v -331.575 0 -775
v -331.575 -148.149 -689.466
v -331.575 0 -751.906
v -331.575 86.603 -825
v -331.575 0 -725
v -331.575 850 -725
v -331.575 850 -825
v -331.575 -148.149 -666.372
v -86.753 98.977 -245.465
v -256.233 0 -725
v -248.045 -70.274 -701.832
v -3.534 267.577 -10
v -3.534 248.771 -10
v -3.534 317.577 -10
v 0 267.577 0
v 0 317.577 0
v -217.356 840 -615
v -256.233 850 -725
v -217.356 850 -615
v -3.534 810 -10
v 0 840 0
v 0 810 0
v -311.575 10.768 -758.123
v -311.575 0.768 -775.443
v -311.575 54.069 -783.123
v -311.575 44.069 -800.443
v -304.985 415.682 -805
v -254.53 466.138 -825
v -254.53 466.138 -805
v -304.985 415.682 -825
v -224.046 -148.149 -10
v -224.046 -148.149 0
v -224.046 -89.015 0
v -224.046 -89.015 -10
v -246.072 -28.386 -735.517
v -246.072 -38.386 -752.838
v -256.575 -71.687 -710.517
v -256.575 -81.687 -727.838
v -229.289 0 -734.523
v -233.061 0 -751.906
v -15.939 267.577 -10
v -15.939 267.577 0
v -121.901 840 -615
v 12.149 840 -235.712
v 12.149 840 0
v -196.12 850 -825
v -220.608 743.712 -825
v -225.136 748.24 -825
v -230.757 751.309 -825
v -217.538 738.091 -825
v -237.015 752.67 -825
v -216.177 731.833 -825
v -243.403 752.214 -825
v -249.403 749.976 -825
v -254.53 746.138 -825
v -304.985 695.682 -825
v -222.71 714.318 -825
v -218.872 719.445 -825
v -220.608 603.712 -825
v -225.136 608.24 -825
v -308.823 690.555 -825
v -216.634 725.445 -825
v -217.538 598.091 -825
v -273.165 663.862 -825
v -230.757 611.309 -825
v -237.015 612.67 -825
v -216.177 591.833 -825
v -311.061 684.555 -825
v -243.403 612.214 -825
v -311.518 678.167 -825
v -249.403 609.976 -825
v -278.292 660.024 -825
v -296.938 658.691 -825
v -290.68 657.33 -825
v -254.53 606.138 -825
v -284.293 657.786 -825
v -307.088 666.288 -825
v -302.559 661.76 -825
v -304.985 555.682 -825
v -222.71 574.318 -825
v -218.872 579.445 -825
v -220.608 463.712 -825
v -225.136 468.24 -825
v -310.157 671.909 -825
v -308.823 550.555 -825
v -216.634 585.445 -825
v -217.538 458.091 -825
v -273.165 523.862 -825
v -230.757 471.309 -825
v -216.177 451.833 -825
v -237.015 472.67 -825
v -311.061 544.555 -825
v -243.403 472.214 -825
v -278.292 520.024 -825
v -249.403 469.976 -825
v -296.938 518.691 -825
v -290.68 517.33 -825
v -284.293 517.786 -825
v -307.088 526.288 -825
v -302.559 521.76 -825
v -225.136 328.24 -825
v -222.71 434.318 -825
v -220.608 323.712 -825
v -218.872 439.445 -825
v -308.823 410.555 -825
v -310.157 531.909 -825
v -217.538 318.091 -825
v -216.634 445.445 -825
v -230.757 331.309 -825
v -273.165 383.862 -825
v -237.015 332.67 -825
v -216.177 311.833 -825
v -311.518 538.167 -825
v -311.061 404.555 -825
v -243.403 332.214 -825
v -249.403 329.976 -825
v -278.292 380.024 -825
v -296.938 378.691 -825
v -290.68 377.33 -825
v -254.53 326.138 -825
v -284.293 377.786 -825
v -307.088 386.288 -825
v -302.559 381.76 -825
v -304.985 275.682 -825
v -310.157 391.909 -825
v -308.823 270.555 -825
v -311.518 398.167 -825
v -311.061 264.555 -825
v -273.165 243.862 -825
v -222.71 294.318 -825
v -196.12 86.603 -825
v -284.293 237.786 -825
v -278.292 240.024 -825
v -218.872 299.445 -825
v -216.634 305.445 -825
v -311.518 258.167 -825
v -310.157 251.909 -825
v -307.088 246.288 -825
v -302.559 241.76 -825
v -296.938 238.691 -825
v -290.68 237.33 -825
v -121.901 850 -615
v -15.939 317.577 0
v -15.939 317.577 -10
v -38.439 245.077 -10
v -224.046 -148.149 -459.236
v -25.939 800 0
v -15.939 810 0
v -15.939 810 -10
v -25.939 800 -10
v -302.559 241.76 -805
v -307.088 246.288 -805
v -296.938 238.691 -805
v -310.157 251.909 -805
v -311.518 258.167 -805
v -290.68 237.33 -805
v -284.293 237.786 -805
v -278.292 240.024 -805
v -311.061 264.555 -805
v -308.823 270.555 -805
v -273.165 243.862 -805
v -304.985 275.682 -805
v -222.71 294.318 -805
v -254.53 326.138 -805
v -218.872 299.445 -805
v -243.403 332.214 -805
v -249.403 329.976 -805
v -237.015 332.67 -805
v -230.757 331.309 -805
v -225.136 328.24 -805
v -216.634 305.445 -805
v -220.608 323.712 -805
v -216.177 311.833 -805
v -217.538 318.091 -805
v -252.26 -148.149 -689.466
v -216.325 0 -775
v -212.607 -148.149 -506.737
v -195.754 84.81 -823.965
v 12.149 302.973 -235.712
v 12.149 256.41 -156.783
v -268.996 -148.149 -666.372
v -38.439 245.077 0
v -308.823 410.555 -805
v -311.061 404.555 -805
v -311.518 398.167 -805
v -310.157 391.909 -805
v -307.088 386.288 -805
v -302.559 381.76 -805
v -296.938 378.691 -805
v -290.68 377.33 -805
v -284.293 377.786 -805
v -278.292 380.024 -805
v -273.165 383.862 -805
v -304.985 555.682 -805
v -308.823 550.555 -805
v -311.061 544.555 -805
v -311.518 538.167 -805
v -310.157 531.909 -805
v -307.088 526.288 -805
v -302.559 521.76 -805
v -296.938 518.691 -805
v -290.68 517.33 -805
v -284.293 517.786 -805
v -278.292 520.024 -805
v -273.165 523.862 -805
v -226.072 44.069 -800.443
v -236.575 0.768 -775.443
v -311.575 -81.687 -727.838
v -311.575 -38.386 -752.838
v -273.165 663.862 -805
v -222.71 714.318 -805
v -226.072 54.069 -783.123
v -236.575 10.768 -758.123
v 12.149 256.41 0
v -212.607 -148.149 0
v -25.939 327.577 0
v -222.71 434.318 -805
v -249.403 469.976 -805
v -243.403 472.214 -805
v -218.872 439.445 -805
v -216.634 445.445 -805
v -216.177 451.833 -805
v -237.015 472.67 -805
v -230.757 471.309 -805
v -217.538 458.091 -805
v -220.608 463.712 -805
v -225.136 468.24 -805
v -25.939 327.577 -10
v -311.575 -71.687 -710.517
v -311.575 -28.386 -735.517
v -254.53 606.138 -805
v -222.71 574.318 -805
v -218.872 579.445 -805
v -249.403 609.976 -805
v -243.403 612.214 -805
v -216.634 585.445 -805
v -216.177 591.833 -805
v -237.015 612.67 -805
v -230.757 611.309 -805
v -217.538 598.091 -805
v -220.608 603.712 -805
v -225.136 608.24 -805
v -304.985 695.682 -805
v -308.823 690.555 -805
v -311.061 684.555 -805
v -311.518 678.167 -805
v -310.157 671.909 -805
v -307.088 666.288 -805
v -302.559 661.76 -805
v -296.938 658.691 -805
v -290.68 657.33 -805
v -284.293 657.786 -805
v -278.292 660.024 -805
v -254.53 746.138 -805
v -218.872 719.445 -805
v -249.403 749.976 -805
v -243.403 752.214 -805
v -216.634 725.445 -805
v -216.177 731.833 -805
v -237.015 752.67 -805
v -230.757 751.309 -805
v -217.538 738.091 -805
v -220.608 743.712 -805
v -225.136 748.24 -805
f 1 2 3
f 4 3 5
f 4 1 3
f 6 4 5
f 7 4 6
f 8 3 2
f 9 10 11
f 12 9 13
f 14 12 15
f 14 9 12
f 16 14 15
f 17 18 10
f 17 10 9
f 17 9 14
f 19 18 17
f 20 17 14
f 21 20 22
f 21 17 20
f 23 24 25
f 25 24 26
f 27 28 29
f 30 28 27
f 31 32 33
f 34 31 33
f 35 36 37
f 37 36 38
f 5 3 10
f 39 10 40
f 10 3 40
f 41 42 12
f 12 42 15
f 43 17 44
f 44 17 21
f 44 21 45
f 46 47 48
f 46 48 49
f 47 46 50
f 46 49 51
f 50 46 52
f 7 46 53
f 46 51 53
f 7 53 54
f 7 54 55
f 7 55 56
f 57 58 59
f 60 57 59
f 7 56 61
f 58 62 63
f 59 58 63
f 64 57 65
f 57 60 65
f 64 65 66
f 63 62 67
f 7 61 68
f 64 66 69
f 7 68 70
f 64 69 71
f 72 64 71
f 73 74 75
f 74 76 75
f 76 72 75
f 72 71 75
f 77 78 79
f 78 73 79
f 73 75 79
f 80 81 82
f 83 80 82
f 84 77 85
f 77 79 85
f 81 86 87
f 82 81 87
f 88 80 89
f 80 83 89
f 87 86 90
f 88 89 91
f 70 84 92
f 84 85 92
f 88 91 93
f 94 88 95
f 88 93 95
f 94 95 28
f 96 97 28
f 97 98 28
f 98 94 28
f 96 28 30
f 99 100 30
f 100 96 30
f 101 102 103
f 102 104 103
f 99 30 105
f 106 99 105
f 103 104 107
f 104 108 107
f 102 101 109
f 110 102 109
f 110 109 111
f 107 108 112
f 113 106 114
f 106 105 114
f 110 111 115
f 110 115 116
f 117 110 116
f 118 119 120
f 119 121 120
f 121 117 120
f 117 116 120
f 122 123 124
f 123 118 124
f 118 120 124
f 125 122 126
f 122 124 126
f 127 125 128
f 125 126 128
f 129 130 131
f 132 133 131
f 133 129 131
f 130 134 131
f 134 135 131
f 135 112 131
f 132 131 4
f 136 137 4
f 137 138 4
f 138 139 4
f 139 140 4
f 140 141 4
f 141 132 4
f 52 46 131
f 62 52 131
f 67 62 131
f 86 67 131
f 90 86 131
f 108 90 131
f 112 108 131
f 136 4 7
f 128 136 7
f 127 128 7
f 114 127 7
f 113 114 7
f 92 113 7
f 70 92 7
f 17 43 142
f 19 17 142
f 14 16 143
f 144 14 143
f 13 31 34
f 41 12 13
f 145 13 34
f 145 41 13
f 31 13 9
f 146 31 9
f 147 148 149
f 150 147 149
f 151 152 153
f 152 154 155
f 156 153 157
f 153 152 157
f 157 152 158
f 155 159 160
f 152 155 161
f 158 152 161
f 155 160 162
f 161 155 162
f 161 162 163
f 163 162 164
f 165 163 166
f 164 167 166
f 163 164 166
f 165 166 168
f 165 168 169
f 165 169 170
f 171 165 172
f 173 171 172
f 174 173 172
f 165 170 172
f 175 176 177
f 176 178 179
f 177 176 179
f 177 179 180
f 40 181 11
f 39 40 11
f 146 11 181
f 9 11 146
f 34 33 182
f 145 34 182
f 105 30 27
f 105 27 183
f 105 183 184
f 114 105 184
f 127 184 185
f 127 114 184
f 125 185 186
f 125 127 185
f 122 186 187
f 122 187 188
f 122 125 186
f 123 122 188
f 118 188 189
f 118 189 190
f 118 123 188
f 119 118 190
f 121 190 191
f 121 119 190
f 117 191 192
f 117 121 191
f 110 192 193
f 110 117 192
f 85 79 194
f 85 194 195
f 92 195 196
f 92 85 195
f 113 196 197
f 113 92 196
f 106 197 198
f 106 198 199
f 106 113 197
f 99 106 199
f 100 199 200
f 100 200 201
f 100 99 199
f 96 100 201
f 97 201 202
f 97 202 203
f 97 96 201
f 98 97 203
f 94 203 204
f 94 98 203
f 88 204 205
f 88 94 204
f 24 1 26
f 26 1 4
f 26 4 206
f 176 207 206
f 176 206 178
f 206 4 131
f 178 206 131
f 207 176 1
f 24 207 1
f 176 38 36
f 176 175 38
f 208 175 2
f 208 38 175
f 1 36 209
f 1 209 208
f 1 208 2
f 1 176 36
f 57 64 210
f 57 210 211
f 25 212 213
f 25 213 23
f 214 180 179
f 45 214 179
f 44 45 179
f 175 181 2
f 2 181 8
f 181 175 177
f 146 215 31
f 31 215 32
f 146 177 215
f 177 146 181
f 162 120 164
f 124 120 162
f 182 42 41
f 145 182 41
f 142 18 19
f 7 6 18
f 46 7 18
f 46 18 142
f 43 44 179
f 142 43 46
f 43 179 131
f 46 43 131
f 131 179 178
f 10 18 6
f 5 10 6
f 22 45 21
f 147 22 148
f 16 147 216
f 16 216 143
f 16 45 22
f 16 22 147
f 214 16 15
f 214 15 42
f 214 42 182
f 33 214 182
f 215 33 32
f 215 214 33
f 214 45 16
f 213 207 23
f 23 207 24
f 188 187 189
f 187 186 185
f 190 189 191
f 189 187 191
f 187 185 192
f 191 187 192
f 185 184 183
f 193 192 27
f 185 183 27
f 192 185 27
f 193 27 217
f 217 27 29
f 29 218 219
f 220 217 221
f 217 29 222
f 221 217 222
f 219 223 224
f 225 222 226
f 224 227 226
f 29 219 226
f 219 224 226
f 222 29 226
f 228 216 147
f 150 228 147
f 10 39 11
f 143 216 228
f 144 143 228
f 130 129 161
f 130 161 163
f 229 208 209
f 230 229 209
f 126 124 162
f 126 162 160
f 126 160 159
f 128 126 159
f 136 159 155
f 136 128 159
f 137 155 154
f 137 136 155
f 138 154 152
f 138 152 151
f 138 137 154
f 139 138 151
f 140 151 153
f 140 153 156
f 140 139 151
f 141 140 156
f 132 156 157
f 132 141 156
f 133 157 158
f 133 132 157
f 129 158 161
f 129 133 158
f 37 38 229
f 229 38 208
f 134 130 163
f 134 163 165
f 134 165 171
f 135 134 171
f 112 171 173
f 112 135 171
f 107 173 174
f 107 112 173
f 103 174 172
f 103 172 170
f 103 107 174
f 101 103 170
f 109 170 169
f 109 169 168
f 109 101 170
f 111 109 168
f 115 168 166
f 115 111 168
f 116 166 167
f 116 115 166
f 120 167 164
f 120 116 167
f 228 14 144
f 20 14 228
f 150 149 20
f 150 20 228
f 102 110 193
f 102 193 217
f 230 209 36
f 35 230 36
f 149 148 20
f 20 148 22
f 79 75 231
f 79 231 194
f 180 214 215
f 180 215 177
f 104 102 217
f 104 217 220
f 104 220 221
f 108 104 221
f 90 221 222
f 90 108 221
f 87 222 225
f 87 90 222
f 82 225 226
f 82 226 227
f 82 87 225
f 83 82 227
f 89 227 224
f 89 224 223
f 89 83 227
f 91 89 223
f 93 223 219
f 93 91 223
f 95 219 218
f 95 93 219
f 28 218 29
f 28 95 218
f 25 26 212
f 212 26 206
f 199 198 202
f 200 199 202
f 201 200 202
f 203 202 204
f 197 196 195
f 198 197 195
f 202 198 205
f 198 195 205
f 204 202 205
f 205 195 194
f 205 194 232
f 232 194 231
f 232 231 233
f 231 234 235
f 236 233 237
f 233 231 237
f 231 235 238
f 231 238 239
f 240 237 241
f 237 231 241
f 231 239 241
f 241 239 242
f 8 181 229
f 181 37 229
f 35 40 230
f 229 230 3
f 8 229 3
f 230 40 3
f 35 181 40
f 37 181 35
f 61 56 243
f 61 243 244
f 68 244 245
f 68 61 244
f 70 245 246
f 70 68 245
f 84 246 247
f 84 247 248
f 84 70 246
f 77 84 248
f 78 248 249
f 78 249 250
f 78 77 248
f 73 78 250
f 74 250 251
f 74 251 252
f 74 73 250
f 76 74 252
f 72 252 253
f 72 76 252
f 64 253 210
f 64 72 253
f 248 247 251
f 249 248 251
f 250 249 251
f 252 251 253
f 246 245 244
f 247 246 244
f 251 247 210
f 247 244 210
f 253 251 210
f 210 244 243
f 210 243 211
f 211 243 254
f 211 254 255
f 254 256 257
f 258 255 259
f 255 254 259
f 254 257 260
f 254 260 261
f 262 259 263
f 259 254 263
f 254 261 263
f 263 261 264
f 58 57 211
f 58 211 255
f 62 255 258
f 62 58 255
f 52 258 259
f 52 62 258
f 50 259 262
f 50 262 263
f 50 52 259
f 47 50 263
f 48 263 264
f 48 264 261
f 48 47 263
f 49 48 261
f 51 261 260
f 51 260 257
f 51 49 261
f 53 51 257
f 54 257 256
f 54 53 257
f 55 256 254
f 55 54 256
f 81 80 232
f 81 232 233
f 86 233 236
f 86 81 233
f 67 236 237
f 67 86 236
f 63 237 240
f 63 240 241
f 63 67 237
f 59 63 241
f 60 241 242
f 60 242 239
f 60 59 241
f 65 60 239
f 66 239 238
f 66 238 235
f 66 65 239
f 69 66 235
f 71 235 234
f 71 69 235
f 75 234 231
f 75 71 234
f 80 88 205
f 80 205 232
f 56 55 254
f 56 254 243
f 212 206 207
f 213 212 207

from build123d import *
from OCP.BRepFilletAPI import BRepFilletAPI_MakeChamfer

# Parameters (mm, degrees)
BOSS_EXTRU_2_DEPTH            = 850
ESQUISSE2_W                   = 135.455554094
ESQUISSE2_H                   = 850
BOSS_EXTRU_4_DEPTH            = 100
ESQUISSE7_W                   = 615
ESQUISSE7_H                   = 10
ENL_V_MAT_EXTRU_5_DEPTH       = 1260.158602645
ENL_V_MAT_EXTRU_6_DEPTH       = 1237.105055174
CHANFREIN1_SIZE               = 40
CHANFREIN1_SIZE2              = 104.203562588
CHANFREIN2_SIZE               = 50
CHANFREIN2_SIZE2              = 86.602540378
CHANFREIN3_SIZE               = 250
CHANFREIN3_SIZE2              = 81.394715296
ENL_V_MAT_EXTRU_9_DEPTH       = 20
BOSS_EXTRU_5_DEPTH            = 20
BOSS_EXTRU_6_DEPTH            = 20
BOSS_EXTRU_7_DEPTH            = 20
BOSS_EXTRU_8_REACH            = 1235.856
BOSS_EXTRU_14_REACH           = 1078.841
ENL_V_MAT_EXTRU_11_DEPTH      = 1231.067968745
ENL_V_MAT_EXTRU_11_DEPTH_BACK = 1231.067968745
ESQUISSE20_W                  = 36.798592216
ESQUISSE20_H                  = 35.835276246
ENL_V_MAT_EXTRU_10_DEPTH      = 1231.067968745
ENL_V_MAT_EXTRU_10_DEPTH_BACK = 1231.067968745
BOSS_EXTRU_15_DEPTH           = 10
ENL_V_MAT_EXTRU_12_DEPTH      = 1231.067968745
BOSS_EXTRU_17_DEPTH           = 10
ENL_V_MAT_EXTRU_13_DEPTH      = 10
CHANFREIN6_SIZE               = 10
CHANFREIN6_SIZE2              = 25.739216822
ENL_V_MAT_EXTRU_7_DEPTH       = 20
ESQUISSE28_W                  = 50.106872135
ESQUISSE28_H                  = 235.71179502
ENL_V_MAT_EXTRU_15_DEPTH      = 1231.067968745


with BuildPart() as part:
    # Esquisse1 → Boss.-Extru.2 (new body)
    with BuildSketch(Plane(origin=(0, 0, 0), x_dir=(1, 0, 0), z_dir=(0, 1, 0))):
        Polygon((0, 0), (95.455554093, 0), (-196.119788372, 825), (-291.575342466, 825), align=None)
    extrude(amount=BOSS_EXTRU_2_DEPTH)

    # Esquisse2 → Boss.-Extru.4 (add)
    with BuildSketch(Plane(origin=(0, 0, -825), x_dir=(-1, 0, 0), z_dir=(0, 0, -1))):
        with Locations((263.847565419, 425)):
            Rectangle(ESQUISSE2_W, ESQUISSE2_H)
    extrude(amount=-BOSS_EXTRU_4_DEPTH)

    # Esquisse7 → Enlèv. mat.-Extru.5 (cut, through all)
    with BuildSketch(Plane.ZY.offset(331.575342466)):
        with Locations((-307.5, 845)):
            Rectangle(ESQUISSE7_W, ESQUISSE7_H)
    extrude(amount=-ENL_V_MAT_EXTRU_5_DEPTH, mode=Mode.SUBTRACT)

    # Esquisse8 → Enlèv. mat.-Extru.6 (cut, through all)
    with BuildSketch(Plane(origin=(84.856246207, 0, -29.990289755), x_dir=(-0.3332254417270876, 0, -0.9428471800805194), z_dir=(0.9428471800805194, 0, -0.3332254417270876))):
        Polygon((-31.808219178, 280), (768.947519086, 0), (-31.808219178, 0), align=None)
    extrude(amount=-ENL_V_MAT_EXTRU_6_DEPTH, mode=Mode.SUBTRACT)

    # Chanfrein1
    chanfrein1_edges = [part.edges().sort_by_distance(p)[0] for p in [
        (-37.960538206, 140, -377.495144878),
    ]]
    chanfrein1_side = [part.faces().sort_by_distance(p)[0] for p in [
        (-82.734004125, 137.238189401, -370.048215647),
    ]]
    chamfer(chanfrein1_edges, length=CHANFREIN1_SIZE, length2=CHANFREIN1_SIZE2, reference=chanfrein1_side[0])

    # Chanfrein2
    chanfrein2_edges = [part.edges().sort_by_distance(p)[0] for p in [
        (-279.375357295, 0, -825),
    ]]
    chanfrein2_side = [part.faces().sort_by_distance(p)[0] for p in [
        (-275.691218494, 0, -775.06397156),
    ]]
    chamfer(chanfrein2_edges, length=CHANFREIN2_SIZE, length2=CHANFREIN2_SIZE2, reference=chanfrein2_side[0])

    # Chanfrein3
    chanfrein3_edges = [part.edges().sort_by_distance(p)[0] for p in [
        (95.455554093, 615.195164523, 0),
    ]]
    chanfrein3_side = [part.faces().sort_by_distance(p)[0] for p in [
        (-63.074276605, 533.547742021, -448.553396936),
    ]]
    chamfer(chanfrein3_edges, length=CHANFREIN3_SIZE, length2=CHANFREIN3_SIZE2, reference=chanfrein3_side[0])

    # Esquisse11 → Enlèv. mat.-Extru.9 (cut)
    with BuildSketch(Plane(origin=(0, 0, -825), x_dir=(-1, 0, 0), z_dir=(0, 0, -1))):
        with BuildLine():
            Line((273.165439889, 663.862320377), (222.709885796, 714.31787447))
            ThreePointArc((222.709885796, 714.31787447), (222.709885796, 746.137679623), (254.529690949, 746.137679623))
            Line((254.529690949, 746.137679623), (304.985245042, 695.68212553))
            ThreePointArc((304.985245042, 695.68212553), (304.985245042, 663.862320377), (273.165439889, 663.862320377))
        make_face()
        with BuildLine():
            Line((273.165439889, 523.862320377), (222.709885796, 574.31787447))
            ThreePointArc((222.709885796, 574.31787447), (222.709885796, 606.137679623), (254.529690949, 606.137679623))
            Line((254.529690949, 606.137679623), (304.985245042, 555.68212553))
            ThreePointArc((304.985245042, 555.68212553), (304.985245042, 523.862320377), (273.165439889, 523.862320377))
        make_face()
        with BuildLine():
            Line((273.165439889, 383.862320377), (222.709885796, 434.31787447))
            ThreePointArc((222.709885796, 434.31787447), (222.709885796, 466.137679623), (254.529690949, 466.137679623))
            Line((254.529690949, 466.137679623), (304.985245042, 415.68212553))
            ThreePointArc((304.985245042, 415.68212553), (304.985245042, 383.862320377), (273.165439889, 383.862320377))
        make_face()
        with BuildLine():
            Line((273.165439889, 243.862320377), (222.709885796, 294.31787447))
            ThreePointArc((222.709885796, 294.31787447), (222.709885796, 326.137679623), (254.529690949, 326.137679623))
            Line((254.529690949, 326.137679623), (304.985245042, 275.68212553))
            ThreePointArc((304.985245042, 275.68212553), (304.985245042, 243.862320377), (273.165439889, 243.862320377))
        make_face()
    extrude(amount=-ENL_V_MAT_EXTRU_9_DEPTH, mode=Mode.SUBTRACT)

    # Esquisse12 → Boss.-Extru.5 (add)
    with BuildSketch(Plane(origin=(-40.719657631, 14.978452192, 8.836336942), x_dir=(-0.1789623557208966, 0.09138543974154965, -0.9796025605509977), z_dir=(0.9196400605905344, -0.33828341108028354, -0.19956576045235425))):
        Polygon((758.2962151, -87.760898196), (129.510578012, 220.360980406), (128.5939647, -274.639019594), (551.387234827, -304.990440115), align=None)
    extrude(amount=-BOSS_EXTRU_5_DEPTH)

    # Esquisse13 → Boss.-Extru.6 (add)
    with BuildSketch(Plane(origin=(0, -335.584843966, -581.25), x_dir=(-1, 0, 0), z_dir=(0, -0.5000000000000013, -0.8660254037844379))):
        Polygon((331.575342466, 387.5), (216.325161863, 387.5), (331.575342466, -161.154885751), align=None)
    extrude(amount=-BOSS_EXTRU_6_DEPTH)

    # Esquisse14 → Boss.-Extru.7 (add)
    with BuildSketch(Plane(origin=(-40.719657631, 14.978452192, 8.836336942), x_dir=(0.18729623755068028, -0.06889566128781024, 0.9798844356632441), z_dir=(-0.9196400605905354, 0.33828341108028165, 0.19956576045235197))):
        Polygon((-558.543564559, -291.678140731), (-760.182954736, -69.548547185), (-765.904204326, -72.183872894), (-799.927326543, -74.681473645), (-671.74280044, -297.07939729), align=None)
    extrude(amount=BOSS_EXTRU_7_DEPTH)

    # Boss.-Extru.8: up to this face of the body (flat: up to its plane)
    boss_extru_8_end = Plane(part.part.faces().sort_by_distance((-164.532158793, -37.982859016, -371.724952169))[0])
    # Esquisse17 → Boss.-Extru.8 (add, up to the picked face)
    with BuildSketch(Plane(origin=(14.059914026, 0, -0.114027244), x_dir=(-0.008109828661301803, 0, -0.9999671147988239), z_dir=(0.999967114798824, 0, -0.008109828661301803)), mode=Mode.PRIVATE) as boss_extru_8_sk1:
        Polygon((0, 268.877630288), (0, -254.375489576), (124.880630316, -230.495880912), (112.743376241, 233.203159991), align=None)
    boss_extru_8_tool1 = split(extrude(boss_extru_8_sk1.sketch, amount=-BOSS_EXTRU_8_REACH, mode=Mode.PRIVATE), bisect_by=boss_extru_8_end, keep=Keep.BOTH, mode=Mode.PRIVATE)
    add(boss_extru_8_tool1.solids().sort_by(Axis((13.587491, -0.094835, -58.365221), (-0.999967114798824, 0, 0.008109828661301803)))[0])

    # Boss.-Extru.14: up to this face of the body (flat: up to its plane)
    boss_extru_14_end = Plane(part.part.faces().sort_by_distance((-146.671728248, -30.602018057, -301.931660273))[0])
    # Esquisse19 → Boss.-Extru.14 (add, up to the picked face)
    with BuildSketch(Plane(origin=(-27.916044034, 239.583966402, -78.987256375), x_dir=(-0.9939328490713287, -0.1044581087967751, 0.034438278754206304), z_dir=(0.1099885973042266, -0.9439555392983614, 0.31120804663599005)), mode=Mode.PRIVATE) as boss_extru_14_sk1:
        Polygon((-42.23311753, -84.700642173), (-41.849173409, -35.141174806), (202.602212611, 697.589071061), (229.71052108, 688.54527409), (-28.086448758, -84.187661354), align=None)
    boss_extru_14_tool1 = split(extrude(boss_extru_14_sk1.sketch, amount=BOSS_EXTRU_14_REACH, mode=Mode.PRIVATE), bisect_by=boss_extru_14_end, keep=Keep.BOTH, mode=Mode.PRIVATE)
    add(boss_extru_14_tool1.solids().sort_by(Axis((-116.11325, 133.026087, -371.027306), (0.1099885973042266, -0.9439555392983614, 0.31120804663599005)))[0])

    # Esquisse20 → Enlèv. mat.-Extru.11 (cut, two sides: drawn at the far end of the back side and taken through both)
    with BuildSketch(Plane(origin=(0, 0, 0), x_dir=(1, 0, 0), z_dir=(0, 1, 0)).offset(-ENL_V_MAT_EXTRU_11_DEPTH_BACK)):
        with Locations((-4.33845731, -17.917638123)):
            Rectangle(ESQUISSE20_W, ESQUISSE20_H)
    extrude(amount=ENL_V_MAT_EXTRU_11_DEPTH + ENL_V_MAT_EXTRU_11_DEPTH_BACK, mode=Mode.SUBTRACT)

    # Esquisse15 → Enlèv. mat.-Extru.10 (cut, two sides: drawn at the far end of the back side and taken through both)
    with BuildSketch(Plane.XY.offset(-ENL_V_MAT_EXTRU_10_DEPTH_BACK)):
        Polygon((-331.575342466, -190.149068971), (-331.575342466, -475.149068971), (14.059914026, -475.149068971), (14.059914026, -190.149068971), (55.846885337, -190.149068971), (55.846885337, 19.850931029), (55.846885337, 270.515982808), (14.060838798, 270.515982808), (14.060838798, 259.850931029), (-235.940085974, -190.149068971), align=None)
    extrude(amount=ENL_V_MAT_EXTRU_10_DEPTH + ENL_V_MAT_EXTRU_10_DEPTH_BACK, mode=Mode.SUBTRACT)

    # Esquisse21 → Boss.-Extru.15 (add)
    with BuildSketch(Plane(origin=(-99.569705588, 55.316707725, 0), x_dir=(0, 0, -1), z_dir=(0.8741565134833756, -0.4856443039247848, 0))):
        Polygon((321.424737861, -305.542159578), (543.068402305, -280.803005995), (155.773656423, 231.37758287), (0, 233.978950164), (0, 205.025992858), (0, -305.542159578), align=None)
    extrude(amount=-BOSS_EXTRU_15_DEPTH)

    # Esquisse23 → Enlèv. mat.-Extru.12 (cut, through all)
    with BuildSketch(Plane.XY):
        Polygon((-331.575342466, -190.149068971), (-331.575342466, -260.816411821), (-102.082537534, -260.816411821), (-102.082537534, -190.149068971), (-102.082537534, -148.149068971), (-331.575342466, -148.149068971), align=None)
    extrude(amount=-ENL_V_MAT_EXTRU_12_DEPTH, mode=Mode.SUBTRACT)

    # Esquisse26 → Boss.-Extru.17 (add)
    with BuildSketch(Plane.XY):
        Polygon((14.060838798, 810), (14.060838798, 317.576928865), (-25.939161202, 317.576928865), (-25.939161202, 810), (0, 810), (0, 840), (14.060838798, 840), align=None)
        Polygon((-25.939161202, 267.576928865), (14.060838798, 267.576928865), (12.797499589, 257.576928865), (-212.606666329, -148.149068971), (-224.046265355, -148.149068971), (-224.046265355, -89.014539546), align=None)
    extrude(amount=-BOSS_EXTRU_17_DEPTH)

    # Esquisse24 → Enlèv. mat.-Extru.13 (cut)
    with BuildSketch(Plane(origin=(14.059914026, 0, -0.114027244), x_dir=(-0.008109828661301803, 0, -0.9999671147988239), z_dir=(0.999967114798824, 0, -0.008109828661301803))):
        Polygon((-0.114030993, 259.850931029), (155.664748246, 257.576928865), (235.605515711, 302.972909907), (235.605515711, 840), (-0.114030993, 840), align=None)
    extrude(amount=ENL_V_MAT_EXTRU_13_DEPTH, mode=Mode.SUBTRACT)

    # Chanfrein6: one chamfer whose edges measure the first distance from different faces: ONE call of the kernel's chamfer builder (chamfer() names one face for all edges)
    chanfrein6_edges_1 = [part.edges().sort_by_distance(p)[0] for p in [
        (-25.939161202, 267.576928865, -5),
    ]]
    chanfrein6_side_1 = [part.faces().sort_by_distance(p)[0] for p in [
        (-13.831610998, 267.576928865, -4.878156509),
    ]]
    chanfrein6_edges_2 = [part.edges().sort_by_distance(p)[0] for p in [
        (-25.939161202, 810, -5),
        (-25.939161202, 317.576928865, -5),
    ]]
    chanfrein6 = BRepFilletAPI_MakeChamfer(part.part.solid().wrapped)
    for e in chanfrein6_edges_1:
        chanfrein6.Add(CHANFREIN6_SIZE, CHANFREIN6_SIZE2, e.wrapped, chanfrein6_side_1[0].wrapped)  # the first distance lies on this face
    for e in chanfrein6_edges_2:
        chanfrein6.Add(CHANFREIN6_SIZE, e.wrapped)
    add(Compound.cast(chanfrein6.Shape()), mode=Mode.REPLACE)

    # Esquisse9 → Enlèv. mat.-Extru.7 (cut)
    with BuildSketch(Plane(origin=(0, -335.584843966, -581.25), x_dir=(-1, 0, 0), z_dir=(0, -0.49999999999999656, -0.8660254037844407))):
        Polygon((311.575342466, 438.386921888), (226.072366588, 438.386921888), (236.575342466, 388.386921888), (311.575342466, 388.386921888), align=None)
        Polygon((311.575342466, 343.175811089), (246.072366588, 343.175811089), (256.575342466, 293.175811089), (311.575342466, 293.175811089), align=None)
    extrude(amount=-ENL_V_MAT_EXTRU_7_DEPTH, mode=Mode.SUBTRACT)

    # Esquisse28 → Enlèv. mat.-Extru.15 (cut, through all)
    with BuildSketch(Plane(origin=(0, 0, 0), x_dir=(1, 0, 0), z_dir=(0, 1, 0))):
        with Locations((37.20262973, 117.85589751)):
            Rectangle(ESQUISSE28_W, ESQUISSE28_H)
    extrude(amount=ENL_V_MAT_EXTRU_15_DEPTH, mode=Mode.SUBTRACT)


solid = part.part
